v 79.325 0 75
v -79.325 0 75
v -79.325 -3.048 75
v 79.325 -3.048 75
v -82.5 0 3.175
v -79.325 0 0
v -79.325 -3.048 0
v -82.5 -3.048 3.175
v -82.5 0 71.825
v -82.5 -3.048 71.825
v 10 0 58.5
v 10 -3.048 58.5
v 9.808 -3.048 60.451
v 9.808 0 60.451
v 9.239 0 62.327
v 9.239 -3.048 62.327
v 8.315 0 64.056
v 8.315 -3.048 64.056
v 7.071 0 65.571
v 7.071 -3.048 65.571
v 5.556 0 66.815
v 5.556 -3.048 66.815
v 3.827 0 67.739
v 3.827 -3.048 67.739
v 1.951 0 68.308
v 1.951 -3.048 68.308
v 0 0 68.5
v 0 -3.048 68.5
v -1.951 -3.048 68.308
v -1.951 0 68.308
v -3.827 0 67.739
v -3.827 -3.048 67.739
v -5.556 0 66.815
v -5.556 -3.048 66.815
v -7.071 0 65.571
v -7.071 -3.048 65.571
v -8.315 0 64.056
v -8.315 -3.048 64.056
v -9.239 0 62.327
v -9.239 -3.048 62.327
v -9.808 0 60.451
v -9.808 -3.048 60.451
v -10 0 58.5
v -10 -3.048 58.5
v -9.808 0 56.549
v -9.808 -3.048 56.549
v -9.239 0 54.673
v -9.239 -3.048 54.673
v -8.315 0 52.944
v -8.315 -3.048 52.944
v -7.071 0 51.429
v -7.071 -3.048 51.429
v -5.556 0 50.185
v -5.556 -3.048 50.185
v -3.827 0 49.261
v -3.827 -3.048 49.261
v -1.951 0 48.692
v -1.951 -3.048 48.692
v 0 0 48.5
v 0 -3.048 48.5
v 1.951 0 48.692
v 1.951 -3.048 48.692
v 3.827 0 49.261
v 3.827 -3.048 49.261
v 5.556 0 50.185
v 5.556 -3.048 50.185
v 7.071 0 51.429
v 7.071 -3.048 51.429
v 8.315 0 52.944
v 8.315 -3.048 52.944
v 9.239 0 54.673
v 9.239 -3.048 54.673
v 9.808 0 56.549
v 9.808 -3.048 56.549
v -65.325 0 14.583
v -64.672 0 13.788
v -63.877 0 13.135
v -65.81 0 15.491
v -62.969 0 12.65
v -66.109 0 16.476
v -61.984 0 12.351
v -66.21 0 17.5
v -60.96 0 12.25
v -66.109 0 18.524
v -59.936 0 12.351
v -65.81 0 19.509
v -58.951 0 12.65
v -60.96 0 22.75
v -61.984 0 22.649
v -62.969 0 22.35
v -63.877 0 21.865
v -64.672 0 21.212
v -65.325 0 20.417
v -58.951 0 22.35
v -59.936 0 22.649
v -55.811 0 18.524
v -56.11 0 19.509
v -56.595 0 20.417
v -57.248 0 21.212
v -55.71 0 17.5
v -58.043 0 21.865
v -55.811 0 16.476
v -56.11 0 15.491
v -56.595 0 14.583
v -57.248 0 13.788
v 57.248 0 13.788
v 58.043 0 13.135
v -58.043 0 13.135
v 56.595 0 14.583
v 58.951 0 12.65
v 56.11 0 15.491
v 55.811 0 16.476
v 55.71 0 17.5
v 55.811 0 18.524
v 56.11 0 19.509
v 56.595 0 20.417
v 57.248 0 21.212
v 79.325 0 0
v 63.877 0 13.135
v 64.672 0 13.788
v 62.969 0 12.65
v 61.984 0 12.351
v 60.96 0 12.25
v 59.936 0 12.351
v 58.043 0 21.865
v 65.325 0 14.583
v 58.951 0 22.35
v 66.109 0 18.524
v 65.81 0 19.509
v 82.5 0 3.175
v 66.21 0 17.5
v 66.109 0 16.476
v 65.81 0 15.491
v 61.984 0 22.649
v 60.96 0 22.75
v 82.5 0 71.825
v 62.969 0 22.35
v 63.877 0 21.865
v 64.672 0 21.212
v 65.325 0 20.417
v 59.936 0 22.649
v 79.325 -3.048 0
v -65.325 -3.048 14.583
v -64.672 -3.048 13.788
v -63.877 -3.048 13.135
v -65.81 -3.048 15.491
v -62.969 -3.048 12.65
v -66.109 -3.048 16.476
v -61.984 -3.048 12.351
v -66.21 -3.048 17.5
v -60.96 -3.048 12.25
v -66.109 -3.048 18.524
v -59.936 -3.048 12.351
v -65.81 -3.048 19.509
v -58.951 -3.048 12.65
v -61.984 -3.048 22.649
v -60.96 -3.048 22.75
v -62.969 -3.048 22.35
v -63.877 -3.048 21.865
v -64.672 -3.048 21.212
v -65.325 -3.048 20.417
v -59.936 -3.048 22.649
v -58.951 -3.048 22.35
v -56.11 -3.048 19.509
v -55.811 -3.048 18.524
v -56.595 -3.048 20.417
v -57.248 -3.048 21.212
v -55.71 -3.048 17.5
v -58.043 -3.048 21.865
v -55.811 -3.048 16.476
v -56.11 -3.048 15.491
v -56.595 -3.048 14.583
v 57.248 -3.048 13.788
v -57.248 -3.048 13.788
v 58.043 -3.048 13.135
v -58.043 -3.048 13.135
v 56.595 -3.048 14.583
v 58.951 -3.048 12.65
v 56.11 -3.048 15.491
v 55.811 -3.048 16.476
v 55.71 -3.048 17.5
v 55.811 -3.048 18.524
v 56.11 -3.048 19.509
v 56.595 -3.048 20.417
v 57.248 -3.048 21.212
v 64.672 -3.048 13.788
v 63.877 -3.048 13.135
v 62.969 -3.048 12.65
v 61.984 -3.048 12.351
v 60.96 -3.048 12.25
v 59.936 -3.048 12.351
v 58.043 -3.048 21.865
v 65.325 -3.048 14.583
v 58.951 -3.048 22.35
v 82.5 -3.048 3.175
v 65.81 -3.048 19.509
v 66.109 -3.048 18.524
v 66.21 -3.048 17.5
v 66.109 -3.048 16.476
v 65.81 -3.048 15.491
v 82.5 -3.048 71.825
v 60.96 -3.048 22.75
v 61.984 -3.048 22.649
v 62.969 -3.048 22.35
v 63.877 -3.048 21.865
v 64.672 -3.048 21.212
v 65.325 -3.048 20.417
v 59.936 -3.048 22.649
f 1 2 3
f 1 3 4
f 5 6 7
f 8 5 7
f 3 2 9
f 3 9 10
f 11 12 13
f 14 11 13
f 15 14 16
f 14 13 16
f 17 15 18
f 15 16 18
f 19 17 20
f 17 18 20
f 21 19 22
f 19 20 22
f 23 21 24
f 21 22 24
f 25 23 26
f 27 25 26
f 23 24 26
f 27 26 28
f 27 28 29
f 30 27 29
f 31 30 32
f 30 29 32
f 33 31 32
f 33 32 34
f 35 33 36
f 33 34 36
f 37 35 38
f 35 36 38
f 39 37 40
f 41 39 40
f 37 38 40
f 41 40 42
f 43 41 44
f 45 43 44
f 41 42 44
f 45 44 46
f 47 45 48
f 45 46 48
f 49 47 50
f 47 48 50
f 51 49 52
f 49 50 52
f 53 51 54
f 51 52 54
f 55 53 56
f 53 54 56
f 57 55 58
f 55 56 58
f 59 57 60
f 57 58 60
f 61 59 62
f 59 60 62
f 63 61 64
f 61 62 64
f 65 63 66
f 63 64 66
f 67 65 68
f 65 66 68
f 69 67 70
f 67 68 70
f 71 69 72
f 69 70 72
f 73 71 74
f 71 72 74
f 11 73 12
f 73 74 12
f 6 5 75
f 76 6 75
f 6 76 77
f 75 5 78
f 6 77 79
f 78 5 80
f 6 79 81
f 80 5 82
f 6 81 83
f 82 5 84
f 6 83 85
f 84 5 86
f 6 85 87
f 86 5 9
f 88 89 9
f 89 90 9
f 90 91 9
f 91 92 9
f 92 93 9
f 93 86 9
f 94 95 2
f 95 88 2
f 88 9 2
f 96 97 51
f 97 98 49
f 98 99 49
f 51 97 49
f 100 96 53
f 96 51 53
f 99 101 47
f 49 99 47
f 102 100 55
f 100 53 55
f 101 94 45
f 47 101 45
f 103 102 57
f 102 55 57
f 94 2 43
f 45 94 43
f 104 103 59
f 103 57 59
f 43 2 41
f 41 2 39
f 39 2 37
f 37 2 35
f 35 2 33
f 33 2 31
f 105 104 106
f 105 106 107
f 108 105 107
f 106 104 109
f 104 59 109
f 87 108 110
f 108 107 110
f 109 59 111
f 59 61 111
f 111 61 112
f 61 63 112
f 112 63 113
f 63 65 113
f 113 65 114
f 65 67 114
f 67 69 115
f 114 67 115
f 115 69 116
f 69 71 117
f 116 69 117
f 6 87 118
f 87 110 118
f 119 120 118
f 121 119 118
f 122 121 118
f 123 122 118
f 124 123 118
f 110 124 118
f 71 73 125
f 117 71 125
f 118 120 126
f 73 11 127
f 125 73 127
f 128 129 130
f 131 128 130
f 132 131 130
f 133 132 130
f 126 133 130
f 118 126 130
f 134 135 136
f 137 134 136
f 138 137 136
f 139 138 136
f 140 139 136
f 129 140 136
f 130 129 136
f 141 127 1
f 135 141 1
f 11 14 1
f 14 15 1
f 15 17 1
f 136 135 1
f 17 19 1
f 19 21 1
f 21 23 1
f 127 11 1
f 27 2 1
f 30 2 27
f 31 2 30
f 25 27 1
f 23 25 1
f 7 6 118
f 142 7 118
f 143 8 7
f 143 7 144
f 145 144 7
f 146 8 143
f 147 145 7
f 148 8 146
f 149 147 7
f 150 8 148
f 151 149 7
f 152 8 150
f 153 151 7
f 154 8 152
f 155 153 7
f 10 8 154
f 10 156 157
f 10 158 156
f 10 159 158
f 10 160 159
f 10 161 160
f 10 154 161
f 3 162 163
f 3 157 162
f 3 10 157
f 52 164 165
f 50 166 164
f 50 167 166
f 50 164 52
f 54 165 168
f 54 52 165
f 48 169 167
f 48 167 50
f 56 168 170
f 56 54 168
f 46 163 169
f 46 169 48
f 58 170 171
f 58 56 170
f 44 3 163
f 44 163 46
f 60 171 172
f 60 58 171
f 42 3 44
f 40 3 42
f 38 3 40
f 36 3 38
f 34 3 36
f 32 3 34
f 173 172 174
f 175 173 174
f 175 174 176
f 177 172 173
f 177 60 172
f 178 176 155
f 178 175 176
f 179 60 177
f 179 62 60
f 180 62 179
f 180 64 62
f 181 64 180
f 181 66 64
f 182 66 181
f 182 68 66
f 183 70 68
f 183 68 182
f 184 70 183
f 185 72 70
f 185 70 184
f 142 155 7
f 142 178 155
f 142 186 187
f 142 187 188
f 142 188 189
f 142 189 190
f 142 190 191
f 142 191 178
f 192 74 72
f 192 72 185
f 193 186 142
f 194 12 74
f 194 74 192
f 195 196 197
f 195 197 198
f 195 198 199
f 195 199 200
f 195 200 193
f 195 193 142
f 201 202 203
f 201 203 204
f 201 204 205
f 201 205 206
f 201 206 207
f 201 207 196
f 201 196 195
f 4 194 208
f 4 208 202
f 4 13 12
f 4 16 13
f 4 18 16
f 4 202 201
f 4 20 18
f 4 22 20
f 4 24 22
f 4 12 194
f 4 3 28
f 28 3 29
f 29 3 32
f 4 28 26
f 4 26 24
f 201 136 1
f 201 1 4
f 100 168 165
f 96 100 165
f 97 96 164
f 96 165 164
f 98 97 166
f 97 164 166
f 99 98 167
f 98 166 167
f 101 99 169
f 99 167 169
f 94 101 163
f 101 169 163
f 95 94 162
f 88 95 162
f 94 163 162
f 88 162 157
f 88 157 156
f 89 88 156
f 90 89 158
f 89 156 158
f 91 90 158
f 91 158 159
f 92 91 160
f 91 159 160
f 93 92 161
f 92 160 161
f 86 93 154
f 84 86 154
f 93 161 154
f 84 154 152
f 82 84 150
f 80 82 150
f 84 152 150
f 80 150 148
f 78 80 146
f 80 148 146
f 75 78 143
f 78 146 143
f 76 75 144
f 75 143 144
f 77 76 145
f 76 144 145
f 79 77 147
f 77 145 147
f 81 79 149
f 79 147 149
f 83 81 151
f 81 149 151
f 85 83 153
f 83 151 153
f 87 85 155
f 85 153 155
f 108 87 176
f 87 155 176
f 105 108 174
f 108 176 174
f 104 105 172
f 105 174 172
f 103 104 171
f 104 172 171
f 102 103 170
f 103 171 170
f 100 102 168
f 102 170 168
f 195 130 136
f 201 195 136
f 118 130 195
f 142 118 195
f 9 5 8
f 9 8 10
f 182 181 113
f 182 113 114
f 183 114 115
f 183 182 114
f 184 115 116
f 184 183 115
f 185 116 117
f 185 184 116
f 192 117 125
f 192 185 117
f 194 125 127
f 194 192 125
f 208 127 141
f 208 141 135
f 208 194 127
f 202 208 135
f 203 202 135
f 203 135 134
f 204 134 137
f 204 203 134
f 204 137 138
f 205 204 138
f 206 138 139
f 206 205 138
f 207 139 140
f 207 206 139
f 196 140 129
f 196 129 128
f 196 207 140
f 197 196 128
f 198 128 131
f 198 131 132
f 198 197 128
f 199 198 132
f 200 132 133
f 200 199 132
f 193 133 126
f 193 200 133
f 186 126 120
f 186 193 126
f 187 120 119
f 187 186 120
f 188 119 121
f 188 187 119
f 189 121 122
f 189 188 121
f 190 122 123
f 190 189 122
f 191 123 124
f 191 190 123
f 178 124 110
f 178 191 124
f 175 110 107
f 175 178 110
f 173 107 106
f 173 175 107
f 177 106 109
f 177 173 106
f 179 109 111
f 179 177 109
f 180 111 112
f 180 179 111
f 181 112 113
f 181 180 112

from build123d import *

# Parameters (mm, degrees)
F0_W     = 165
F0_H     = 75
F1_DEPTH = 3.048
F2_R     = 5.25
F3_DEPTH = 3.048
F4_R     = 10
F5_DEPTH = 3.048
F6_SIZE  = 3.175


# Not quite as in the source:
# - a pattern or mirror of a feature is missing from the dataset's text; its kind, count and spacing are read off the source's solid


with BuildPart() as f1:
    # F0 (on Front) → F1 (new body)
    with BuildSketch(Plane.XZ):
        with Locations((0, 37.5)):
            Rectangle(F0_W, F0_H)
    extrude(amount=F1_DEPTH)

    # F2 (on face) → F3 (cut)
    with BuildSketch(Plane.XZ.offset(3.048)):
        with Locations((-60.96, 17.5)):
            Circle(F2_R)
    f3 = extrude(amount=-F3_DEPTH, mode=Mode.SUBTRACT)

    # F3_copies: F3 across plane
    add(f3.mirror(Plane(origin=(0, 0, 0), x_dir=(0, 0, 1), z_dir=(1, 0, 0))), mode=Mode.SUBTRACT)

    # F4 (on face) → F5 (cut)
    with BuildSketch(Plane.XZ.offset(3.048)):
        with Locations((0, 58.5)):
            Circle(F4_R)
    extrude(amount=-F5_DEPTH, mode=Mode.SUBTRACT)

    # F6
    f6_edges = [f1.edges().sort_by_distance(p)[0] for p in [
        (-82.5, -1.524, 75),
        (-82.5, -1.524, 0),
        (82.5, -1.524, 0),
        (82.5, -1.524, 75),
    ]]
    chamfer(f6_edges, length=F6_SIZE)


solid = f1.part
